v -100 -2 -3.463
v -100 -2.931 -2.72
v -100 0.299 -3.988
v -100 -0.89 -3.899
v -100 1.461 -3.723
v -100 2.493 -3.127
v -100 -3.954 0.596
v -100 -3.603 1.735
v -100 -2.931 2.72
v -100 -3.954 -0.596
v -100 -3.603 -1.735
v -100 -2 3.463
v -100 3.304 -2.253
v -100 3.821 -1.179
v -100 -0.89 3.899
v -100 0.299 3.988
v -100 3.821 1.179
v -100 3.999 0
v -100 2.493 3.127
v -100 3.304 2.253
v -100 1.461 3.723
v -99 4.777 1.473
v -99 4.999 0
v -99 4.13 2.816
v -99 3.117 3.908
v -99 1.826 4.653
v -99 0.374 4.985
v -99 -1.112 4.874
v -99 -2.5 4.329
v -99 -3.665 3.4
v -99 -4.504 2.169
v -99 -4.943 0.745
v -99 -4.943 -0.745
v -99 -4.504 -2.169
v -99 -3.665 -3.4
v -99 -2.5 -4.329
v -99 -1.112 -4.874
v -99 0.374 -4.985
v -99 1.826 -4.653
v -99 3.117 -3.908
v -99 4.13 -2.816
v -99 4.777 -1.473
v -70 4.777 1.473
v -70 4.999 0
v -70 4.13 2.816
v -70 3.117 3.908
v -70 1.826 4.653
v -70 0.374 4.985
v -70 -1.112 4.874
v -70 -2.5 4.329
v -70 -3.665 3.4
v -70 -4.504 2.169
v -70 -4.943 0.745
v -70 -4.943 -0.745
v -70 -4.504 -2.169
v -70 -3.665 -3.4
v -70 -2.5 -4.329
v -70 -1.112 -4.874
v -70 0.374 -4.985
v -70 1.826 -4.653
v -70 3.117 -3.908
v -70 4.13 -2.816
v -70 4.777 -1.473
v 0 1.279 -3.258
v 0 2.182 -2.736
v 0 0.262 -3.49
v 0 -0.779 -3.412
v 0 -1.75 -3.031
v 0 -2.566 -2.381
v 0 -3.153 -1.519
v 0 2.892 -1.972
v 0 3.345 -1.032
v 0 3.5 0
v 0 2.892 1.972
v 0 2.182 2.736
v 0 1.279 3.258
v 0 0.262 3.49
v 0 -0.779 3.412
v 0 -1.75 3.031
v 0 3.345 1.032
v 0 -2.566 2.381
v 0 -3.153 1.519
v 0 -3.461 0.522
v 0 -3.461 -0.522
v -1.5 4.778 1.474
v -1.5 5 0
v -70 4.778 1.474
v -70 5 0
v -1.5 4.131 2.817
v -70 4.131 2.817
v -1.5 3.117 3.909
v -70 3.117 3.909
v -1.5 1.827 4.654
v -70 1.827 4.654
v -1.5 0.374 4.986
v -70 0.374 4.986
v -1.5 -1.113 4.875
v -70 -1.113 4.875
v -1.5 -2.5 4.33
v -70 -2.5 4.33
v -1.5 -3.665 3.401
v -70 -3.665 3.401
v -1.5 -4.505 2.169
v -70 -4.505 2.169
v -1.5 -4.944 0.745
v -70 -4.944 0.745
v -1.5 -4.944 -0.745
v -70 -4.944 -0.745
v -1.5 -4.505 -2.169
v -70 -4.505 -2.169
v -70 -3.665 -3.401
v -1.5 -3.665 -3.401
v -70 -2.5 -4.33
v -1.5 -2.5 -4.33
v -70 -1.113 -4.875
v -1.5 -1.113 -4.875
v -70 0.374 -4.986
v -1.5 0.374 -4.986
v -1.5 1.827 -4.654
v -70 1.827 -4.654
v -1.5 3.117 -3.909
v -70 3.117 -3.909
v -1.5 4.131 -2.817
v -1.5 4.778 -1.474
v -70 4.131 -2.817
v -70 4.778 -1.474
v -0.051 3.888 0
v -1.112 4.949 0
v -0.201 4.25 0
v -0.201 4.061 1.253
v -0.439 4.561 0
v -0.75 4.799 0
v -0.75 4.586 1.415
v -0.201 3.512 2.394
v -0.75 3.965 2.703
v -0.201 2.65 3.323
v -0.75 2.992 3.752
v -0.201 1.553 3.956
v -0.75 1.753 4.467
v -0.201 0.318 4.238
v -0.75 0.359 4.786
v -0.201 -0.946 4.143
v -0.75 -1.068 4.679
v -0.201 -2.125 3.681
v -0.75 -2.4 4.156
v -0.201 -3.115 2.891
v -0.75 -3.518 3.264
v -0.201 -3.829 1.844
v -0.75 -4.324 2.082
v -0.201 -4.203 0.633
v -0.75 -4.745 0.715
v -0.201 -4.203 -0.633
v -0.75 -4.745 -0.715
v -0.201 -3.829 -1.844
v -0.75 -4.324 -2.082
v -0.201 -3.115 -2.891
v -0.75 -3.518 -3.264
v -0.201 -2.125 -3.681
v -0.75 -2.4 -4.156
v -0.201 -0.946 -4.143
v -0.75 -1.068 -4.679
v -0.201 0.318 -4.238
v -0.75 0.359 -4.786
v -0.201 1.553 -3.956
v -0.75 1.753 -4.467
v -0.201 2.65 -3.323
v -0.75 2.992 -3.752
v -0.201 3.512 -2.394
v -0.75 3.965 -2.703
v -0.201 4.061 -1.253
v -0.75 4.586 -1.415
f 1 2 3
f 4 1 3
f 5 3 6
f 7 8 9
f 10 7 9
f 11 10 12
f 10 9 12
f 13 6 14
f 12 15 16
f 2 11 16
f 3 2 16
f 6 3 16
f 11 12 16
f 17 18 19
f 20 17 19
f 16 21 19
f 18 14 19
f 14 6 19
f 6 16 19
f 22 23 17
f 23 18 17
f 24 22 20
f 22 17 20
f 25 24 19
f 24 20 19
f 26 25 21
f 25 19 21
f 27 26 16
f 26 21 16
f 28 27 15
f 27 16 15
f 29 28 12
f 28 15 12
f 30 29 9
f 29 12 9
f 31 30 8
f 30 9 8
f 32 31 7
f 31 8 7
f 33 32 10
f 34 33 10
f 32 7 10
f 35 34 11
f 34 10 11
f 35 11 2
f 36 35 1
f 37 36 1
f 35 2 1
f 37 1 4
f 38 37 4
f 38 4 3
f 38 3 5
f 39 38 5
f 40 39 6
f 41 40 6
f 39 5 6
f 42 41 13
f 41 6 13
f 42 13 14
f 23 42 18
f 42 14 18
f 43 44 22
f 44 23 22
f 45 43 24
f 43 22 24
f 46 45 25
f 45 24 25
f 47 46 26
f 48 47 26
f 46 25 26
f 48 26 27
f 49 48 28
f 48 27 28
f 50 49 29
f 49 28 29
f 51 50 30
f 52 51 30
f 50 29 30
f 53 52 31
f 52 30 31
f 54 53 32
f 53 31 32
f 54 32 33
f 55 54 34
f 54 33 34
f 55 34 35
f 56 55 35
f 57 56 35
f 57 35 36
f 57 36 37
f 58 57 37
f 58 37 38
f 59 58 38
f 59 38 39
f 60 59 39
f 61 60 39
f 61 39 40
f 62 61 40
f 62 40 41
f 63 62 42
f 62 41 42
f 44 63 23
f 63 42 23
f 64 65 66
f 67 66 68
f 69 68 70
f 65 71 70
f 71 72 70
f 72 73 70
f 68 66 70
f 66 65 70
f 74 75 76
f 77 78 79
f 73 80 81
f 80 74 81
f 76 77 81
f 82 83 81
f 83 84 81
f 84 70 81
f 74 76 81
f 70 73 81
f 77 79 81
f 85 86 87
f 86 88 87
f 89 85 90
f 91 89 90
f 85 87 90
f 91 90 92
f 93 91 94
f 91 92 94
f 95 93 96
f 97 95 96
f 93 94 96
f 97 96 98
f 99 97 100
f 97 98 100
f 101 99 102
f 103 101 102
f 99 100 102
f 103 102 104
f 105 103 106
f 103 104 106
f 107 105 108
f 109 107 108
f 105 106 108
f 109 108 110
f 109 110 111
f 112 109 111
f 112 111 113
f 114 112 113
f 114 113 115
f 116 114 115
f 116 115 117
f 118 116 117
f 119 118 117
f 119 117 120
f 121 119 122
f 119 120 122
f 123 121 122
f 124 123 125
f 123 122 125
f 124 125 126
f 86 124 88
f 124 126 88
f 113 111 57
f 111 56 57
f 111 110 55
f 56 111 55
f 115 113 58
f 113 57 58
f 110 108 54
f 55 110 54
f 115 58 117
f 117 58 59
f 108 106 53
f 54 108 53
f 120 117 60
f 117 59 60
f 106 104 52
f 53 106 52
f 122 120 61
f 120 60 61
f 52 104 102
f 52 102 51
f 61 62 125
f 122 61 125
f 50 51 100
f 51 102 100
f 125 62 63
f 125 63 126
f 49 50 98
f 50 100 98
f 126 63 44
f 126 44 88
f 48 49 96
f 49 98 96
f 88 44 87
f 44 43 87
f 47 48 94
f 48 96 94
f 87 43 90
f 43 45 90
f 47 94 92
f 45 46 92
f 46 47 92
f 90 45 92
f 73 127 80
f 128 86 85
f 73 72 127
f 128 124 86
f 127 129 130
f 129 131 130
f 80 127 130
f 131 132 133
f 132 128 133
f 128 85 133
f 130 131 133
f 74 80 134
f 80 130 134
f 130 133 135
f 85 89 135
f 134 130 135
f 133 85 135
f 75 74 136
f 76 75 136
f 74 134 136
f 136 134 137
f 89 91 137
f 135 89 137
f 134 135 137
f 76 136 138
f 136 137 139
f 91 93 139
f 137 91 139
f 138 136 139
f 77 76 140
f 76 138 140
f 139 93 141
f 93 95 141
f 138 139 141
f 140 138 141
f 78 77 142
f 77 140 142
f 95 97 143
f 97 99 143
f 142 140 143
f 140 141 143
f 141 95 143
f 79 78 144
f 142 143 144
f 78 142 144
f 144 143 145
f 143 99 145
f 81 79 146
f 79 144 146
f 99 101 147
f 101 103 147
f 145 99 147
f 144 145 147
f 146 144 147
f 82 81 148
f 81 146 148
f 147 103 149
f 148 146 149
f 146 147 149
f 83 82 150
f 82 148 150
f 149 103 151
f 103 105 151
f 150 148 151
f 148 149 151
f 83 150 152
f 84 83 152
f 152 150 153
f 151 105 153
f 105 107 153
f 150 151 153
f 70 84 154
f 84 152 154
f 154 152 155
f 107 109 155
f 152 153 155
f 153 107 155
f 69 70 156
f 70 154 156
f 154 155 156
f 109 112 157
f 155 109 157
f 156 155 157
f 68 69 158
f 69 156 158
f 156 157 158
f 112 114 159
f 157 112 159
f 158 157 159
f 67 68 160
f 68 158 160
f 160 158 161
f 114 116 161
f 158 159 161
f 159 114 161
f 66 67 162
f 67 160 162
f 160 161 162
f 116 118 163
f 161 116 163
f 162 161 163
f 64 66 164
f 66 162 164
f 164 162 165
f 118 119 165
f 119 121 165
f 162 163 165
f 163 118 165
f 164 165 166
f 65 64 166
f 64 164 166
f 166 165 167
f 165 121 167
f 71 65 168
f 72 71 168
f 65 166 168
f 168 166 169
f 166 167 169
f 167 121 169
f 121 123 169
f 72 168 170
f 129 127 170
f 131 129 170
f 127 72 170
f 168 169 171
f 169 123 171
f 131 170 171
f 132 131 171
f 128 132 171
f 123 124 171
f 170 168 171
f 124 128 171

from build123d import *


with BuildPart() as part:
    # Esquisse1 → Révolution1 (revolve)
    with BuildSketch(Plane.XY):
        with BuildLine():
            Line((-100, 0), (0, 0))
            Line((0, 0), (0, 3.5))
            ThreePointArc((0, 3.5), (-0.439339828, 4.560660172), (-1.5, 5))
            Line((-1.5, 5), (-70, 5))
            Line((-70, 5), (-70, 4.999))
            Line((-70, 4.999), (-99, 4.999))
            Line((-99, 4.999), (-100, 3.999))
            Line((-100, 3.999), (-100, 0))
        make_face()
    revolve(axis=Axis((-100, 0, 0), (1, 0, 0)))


solid = part.part
